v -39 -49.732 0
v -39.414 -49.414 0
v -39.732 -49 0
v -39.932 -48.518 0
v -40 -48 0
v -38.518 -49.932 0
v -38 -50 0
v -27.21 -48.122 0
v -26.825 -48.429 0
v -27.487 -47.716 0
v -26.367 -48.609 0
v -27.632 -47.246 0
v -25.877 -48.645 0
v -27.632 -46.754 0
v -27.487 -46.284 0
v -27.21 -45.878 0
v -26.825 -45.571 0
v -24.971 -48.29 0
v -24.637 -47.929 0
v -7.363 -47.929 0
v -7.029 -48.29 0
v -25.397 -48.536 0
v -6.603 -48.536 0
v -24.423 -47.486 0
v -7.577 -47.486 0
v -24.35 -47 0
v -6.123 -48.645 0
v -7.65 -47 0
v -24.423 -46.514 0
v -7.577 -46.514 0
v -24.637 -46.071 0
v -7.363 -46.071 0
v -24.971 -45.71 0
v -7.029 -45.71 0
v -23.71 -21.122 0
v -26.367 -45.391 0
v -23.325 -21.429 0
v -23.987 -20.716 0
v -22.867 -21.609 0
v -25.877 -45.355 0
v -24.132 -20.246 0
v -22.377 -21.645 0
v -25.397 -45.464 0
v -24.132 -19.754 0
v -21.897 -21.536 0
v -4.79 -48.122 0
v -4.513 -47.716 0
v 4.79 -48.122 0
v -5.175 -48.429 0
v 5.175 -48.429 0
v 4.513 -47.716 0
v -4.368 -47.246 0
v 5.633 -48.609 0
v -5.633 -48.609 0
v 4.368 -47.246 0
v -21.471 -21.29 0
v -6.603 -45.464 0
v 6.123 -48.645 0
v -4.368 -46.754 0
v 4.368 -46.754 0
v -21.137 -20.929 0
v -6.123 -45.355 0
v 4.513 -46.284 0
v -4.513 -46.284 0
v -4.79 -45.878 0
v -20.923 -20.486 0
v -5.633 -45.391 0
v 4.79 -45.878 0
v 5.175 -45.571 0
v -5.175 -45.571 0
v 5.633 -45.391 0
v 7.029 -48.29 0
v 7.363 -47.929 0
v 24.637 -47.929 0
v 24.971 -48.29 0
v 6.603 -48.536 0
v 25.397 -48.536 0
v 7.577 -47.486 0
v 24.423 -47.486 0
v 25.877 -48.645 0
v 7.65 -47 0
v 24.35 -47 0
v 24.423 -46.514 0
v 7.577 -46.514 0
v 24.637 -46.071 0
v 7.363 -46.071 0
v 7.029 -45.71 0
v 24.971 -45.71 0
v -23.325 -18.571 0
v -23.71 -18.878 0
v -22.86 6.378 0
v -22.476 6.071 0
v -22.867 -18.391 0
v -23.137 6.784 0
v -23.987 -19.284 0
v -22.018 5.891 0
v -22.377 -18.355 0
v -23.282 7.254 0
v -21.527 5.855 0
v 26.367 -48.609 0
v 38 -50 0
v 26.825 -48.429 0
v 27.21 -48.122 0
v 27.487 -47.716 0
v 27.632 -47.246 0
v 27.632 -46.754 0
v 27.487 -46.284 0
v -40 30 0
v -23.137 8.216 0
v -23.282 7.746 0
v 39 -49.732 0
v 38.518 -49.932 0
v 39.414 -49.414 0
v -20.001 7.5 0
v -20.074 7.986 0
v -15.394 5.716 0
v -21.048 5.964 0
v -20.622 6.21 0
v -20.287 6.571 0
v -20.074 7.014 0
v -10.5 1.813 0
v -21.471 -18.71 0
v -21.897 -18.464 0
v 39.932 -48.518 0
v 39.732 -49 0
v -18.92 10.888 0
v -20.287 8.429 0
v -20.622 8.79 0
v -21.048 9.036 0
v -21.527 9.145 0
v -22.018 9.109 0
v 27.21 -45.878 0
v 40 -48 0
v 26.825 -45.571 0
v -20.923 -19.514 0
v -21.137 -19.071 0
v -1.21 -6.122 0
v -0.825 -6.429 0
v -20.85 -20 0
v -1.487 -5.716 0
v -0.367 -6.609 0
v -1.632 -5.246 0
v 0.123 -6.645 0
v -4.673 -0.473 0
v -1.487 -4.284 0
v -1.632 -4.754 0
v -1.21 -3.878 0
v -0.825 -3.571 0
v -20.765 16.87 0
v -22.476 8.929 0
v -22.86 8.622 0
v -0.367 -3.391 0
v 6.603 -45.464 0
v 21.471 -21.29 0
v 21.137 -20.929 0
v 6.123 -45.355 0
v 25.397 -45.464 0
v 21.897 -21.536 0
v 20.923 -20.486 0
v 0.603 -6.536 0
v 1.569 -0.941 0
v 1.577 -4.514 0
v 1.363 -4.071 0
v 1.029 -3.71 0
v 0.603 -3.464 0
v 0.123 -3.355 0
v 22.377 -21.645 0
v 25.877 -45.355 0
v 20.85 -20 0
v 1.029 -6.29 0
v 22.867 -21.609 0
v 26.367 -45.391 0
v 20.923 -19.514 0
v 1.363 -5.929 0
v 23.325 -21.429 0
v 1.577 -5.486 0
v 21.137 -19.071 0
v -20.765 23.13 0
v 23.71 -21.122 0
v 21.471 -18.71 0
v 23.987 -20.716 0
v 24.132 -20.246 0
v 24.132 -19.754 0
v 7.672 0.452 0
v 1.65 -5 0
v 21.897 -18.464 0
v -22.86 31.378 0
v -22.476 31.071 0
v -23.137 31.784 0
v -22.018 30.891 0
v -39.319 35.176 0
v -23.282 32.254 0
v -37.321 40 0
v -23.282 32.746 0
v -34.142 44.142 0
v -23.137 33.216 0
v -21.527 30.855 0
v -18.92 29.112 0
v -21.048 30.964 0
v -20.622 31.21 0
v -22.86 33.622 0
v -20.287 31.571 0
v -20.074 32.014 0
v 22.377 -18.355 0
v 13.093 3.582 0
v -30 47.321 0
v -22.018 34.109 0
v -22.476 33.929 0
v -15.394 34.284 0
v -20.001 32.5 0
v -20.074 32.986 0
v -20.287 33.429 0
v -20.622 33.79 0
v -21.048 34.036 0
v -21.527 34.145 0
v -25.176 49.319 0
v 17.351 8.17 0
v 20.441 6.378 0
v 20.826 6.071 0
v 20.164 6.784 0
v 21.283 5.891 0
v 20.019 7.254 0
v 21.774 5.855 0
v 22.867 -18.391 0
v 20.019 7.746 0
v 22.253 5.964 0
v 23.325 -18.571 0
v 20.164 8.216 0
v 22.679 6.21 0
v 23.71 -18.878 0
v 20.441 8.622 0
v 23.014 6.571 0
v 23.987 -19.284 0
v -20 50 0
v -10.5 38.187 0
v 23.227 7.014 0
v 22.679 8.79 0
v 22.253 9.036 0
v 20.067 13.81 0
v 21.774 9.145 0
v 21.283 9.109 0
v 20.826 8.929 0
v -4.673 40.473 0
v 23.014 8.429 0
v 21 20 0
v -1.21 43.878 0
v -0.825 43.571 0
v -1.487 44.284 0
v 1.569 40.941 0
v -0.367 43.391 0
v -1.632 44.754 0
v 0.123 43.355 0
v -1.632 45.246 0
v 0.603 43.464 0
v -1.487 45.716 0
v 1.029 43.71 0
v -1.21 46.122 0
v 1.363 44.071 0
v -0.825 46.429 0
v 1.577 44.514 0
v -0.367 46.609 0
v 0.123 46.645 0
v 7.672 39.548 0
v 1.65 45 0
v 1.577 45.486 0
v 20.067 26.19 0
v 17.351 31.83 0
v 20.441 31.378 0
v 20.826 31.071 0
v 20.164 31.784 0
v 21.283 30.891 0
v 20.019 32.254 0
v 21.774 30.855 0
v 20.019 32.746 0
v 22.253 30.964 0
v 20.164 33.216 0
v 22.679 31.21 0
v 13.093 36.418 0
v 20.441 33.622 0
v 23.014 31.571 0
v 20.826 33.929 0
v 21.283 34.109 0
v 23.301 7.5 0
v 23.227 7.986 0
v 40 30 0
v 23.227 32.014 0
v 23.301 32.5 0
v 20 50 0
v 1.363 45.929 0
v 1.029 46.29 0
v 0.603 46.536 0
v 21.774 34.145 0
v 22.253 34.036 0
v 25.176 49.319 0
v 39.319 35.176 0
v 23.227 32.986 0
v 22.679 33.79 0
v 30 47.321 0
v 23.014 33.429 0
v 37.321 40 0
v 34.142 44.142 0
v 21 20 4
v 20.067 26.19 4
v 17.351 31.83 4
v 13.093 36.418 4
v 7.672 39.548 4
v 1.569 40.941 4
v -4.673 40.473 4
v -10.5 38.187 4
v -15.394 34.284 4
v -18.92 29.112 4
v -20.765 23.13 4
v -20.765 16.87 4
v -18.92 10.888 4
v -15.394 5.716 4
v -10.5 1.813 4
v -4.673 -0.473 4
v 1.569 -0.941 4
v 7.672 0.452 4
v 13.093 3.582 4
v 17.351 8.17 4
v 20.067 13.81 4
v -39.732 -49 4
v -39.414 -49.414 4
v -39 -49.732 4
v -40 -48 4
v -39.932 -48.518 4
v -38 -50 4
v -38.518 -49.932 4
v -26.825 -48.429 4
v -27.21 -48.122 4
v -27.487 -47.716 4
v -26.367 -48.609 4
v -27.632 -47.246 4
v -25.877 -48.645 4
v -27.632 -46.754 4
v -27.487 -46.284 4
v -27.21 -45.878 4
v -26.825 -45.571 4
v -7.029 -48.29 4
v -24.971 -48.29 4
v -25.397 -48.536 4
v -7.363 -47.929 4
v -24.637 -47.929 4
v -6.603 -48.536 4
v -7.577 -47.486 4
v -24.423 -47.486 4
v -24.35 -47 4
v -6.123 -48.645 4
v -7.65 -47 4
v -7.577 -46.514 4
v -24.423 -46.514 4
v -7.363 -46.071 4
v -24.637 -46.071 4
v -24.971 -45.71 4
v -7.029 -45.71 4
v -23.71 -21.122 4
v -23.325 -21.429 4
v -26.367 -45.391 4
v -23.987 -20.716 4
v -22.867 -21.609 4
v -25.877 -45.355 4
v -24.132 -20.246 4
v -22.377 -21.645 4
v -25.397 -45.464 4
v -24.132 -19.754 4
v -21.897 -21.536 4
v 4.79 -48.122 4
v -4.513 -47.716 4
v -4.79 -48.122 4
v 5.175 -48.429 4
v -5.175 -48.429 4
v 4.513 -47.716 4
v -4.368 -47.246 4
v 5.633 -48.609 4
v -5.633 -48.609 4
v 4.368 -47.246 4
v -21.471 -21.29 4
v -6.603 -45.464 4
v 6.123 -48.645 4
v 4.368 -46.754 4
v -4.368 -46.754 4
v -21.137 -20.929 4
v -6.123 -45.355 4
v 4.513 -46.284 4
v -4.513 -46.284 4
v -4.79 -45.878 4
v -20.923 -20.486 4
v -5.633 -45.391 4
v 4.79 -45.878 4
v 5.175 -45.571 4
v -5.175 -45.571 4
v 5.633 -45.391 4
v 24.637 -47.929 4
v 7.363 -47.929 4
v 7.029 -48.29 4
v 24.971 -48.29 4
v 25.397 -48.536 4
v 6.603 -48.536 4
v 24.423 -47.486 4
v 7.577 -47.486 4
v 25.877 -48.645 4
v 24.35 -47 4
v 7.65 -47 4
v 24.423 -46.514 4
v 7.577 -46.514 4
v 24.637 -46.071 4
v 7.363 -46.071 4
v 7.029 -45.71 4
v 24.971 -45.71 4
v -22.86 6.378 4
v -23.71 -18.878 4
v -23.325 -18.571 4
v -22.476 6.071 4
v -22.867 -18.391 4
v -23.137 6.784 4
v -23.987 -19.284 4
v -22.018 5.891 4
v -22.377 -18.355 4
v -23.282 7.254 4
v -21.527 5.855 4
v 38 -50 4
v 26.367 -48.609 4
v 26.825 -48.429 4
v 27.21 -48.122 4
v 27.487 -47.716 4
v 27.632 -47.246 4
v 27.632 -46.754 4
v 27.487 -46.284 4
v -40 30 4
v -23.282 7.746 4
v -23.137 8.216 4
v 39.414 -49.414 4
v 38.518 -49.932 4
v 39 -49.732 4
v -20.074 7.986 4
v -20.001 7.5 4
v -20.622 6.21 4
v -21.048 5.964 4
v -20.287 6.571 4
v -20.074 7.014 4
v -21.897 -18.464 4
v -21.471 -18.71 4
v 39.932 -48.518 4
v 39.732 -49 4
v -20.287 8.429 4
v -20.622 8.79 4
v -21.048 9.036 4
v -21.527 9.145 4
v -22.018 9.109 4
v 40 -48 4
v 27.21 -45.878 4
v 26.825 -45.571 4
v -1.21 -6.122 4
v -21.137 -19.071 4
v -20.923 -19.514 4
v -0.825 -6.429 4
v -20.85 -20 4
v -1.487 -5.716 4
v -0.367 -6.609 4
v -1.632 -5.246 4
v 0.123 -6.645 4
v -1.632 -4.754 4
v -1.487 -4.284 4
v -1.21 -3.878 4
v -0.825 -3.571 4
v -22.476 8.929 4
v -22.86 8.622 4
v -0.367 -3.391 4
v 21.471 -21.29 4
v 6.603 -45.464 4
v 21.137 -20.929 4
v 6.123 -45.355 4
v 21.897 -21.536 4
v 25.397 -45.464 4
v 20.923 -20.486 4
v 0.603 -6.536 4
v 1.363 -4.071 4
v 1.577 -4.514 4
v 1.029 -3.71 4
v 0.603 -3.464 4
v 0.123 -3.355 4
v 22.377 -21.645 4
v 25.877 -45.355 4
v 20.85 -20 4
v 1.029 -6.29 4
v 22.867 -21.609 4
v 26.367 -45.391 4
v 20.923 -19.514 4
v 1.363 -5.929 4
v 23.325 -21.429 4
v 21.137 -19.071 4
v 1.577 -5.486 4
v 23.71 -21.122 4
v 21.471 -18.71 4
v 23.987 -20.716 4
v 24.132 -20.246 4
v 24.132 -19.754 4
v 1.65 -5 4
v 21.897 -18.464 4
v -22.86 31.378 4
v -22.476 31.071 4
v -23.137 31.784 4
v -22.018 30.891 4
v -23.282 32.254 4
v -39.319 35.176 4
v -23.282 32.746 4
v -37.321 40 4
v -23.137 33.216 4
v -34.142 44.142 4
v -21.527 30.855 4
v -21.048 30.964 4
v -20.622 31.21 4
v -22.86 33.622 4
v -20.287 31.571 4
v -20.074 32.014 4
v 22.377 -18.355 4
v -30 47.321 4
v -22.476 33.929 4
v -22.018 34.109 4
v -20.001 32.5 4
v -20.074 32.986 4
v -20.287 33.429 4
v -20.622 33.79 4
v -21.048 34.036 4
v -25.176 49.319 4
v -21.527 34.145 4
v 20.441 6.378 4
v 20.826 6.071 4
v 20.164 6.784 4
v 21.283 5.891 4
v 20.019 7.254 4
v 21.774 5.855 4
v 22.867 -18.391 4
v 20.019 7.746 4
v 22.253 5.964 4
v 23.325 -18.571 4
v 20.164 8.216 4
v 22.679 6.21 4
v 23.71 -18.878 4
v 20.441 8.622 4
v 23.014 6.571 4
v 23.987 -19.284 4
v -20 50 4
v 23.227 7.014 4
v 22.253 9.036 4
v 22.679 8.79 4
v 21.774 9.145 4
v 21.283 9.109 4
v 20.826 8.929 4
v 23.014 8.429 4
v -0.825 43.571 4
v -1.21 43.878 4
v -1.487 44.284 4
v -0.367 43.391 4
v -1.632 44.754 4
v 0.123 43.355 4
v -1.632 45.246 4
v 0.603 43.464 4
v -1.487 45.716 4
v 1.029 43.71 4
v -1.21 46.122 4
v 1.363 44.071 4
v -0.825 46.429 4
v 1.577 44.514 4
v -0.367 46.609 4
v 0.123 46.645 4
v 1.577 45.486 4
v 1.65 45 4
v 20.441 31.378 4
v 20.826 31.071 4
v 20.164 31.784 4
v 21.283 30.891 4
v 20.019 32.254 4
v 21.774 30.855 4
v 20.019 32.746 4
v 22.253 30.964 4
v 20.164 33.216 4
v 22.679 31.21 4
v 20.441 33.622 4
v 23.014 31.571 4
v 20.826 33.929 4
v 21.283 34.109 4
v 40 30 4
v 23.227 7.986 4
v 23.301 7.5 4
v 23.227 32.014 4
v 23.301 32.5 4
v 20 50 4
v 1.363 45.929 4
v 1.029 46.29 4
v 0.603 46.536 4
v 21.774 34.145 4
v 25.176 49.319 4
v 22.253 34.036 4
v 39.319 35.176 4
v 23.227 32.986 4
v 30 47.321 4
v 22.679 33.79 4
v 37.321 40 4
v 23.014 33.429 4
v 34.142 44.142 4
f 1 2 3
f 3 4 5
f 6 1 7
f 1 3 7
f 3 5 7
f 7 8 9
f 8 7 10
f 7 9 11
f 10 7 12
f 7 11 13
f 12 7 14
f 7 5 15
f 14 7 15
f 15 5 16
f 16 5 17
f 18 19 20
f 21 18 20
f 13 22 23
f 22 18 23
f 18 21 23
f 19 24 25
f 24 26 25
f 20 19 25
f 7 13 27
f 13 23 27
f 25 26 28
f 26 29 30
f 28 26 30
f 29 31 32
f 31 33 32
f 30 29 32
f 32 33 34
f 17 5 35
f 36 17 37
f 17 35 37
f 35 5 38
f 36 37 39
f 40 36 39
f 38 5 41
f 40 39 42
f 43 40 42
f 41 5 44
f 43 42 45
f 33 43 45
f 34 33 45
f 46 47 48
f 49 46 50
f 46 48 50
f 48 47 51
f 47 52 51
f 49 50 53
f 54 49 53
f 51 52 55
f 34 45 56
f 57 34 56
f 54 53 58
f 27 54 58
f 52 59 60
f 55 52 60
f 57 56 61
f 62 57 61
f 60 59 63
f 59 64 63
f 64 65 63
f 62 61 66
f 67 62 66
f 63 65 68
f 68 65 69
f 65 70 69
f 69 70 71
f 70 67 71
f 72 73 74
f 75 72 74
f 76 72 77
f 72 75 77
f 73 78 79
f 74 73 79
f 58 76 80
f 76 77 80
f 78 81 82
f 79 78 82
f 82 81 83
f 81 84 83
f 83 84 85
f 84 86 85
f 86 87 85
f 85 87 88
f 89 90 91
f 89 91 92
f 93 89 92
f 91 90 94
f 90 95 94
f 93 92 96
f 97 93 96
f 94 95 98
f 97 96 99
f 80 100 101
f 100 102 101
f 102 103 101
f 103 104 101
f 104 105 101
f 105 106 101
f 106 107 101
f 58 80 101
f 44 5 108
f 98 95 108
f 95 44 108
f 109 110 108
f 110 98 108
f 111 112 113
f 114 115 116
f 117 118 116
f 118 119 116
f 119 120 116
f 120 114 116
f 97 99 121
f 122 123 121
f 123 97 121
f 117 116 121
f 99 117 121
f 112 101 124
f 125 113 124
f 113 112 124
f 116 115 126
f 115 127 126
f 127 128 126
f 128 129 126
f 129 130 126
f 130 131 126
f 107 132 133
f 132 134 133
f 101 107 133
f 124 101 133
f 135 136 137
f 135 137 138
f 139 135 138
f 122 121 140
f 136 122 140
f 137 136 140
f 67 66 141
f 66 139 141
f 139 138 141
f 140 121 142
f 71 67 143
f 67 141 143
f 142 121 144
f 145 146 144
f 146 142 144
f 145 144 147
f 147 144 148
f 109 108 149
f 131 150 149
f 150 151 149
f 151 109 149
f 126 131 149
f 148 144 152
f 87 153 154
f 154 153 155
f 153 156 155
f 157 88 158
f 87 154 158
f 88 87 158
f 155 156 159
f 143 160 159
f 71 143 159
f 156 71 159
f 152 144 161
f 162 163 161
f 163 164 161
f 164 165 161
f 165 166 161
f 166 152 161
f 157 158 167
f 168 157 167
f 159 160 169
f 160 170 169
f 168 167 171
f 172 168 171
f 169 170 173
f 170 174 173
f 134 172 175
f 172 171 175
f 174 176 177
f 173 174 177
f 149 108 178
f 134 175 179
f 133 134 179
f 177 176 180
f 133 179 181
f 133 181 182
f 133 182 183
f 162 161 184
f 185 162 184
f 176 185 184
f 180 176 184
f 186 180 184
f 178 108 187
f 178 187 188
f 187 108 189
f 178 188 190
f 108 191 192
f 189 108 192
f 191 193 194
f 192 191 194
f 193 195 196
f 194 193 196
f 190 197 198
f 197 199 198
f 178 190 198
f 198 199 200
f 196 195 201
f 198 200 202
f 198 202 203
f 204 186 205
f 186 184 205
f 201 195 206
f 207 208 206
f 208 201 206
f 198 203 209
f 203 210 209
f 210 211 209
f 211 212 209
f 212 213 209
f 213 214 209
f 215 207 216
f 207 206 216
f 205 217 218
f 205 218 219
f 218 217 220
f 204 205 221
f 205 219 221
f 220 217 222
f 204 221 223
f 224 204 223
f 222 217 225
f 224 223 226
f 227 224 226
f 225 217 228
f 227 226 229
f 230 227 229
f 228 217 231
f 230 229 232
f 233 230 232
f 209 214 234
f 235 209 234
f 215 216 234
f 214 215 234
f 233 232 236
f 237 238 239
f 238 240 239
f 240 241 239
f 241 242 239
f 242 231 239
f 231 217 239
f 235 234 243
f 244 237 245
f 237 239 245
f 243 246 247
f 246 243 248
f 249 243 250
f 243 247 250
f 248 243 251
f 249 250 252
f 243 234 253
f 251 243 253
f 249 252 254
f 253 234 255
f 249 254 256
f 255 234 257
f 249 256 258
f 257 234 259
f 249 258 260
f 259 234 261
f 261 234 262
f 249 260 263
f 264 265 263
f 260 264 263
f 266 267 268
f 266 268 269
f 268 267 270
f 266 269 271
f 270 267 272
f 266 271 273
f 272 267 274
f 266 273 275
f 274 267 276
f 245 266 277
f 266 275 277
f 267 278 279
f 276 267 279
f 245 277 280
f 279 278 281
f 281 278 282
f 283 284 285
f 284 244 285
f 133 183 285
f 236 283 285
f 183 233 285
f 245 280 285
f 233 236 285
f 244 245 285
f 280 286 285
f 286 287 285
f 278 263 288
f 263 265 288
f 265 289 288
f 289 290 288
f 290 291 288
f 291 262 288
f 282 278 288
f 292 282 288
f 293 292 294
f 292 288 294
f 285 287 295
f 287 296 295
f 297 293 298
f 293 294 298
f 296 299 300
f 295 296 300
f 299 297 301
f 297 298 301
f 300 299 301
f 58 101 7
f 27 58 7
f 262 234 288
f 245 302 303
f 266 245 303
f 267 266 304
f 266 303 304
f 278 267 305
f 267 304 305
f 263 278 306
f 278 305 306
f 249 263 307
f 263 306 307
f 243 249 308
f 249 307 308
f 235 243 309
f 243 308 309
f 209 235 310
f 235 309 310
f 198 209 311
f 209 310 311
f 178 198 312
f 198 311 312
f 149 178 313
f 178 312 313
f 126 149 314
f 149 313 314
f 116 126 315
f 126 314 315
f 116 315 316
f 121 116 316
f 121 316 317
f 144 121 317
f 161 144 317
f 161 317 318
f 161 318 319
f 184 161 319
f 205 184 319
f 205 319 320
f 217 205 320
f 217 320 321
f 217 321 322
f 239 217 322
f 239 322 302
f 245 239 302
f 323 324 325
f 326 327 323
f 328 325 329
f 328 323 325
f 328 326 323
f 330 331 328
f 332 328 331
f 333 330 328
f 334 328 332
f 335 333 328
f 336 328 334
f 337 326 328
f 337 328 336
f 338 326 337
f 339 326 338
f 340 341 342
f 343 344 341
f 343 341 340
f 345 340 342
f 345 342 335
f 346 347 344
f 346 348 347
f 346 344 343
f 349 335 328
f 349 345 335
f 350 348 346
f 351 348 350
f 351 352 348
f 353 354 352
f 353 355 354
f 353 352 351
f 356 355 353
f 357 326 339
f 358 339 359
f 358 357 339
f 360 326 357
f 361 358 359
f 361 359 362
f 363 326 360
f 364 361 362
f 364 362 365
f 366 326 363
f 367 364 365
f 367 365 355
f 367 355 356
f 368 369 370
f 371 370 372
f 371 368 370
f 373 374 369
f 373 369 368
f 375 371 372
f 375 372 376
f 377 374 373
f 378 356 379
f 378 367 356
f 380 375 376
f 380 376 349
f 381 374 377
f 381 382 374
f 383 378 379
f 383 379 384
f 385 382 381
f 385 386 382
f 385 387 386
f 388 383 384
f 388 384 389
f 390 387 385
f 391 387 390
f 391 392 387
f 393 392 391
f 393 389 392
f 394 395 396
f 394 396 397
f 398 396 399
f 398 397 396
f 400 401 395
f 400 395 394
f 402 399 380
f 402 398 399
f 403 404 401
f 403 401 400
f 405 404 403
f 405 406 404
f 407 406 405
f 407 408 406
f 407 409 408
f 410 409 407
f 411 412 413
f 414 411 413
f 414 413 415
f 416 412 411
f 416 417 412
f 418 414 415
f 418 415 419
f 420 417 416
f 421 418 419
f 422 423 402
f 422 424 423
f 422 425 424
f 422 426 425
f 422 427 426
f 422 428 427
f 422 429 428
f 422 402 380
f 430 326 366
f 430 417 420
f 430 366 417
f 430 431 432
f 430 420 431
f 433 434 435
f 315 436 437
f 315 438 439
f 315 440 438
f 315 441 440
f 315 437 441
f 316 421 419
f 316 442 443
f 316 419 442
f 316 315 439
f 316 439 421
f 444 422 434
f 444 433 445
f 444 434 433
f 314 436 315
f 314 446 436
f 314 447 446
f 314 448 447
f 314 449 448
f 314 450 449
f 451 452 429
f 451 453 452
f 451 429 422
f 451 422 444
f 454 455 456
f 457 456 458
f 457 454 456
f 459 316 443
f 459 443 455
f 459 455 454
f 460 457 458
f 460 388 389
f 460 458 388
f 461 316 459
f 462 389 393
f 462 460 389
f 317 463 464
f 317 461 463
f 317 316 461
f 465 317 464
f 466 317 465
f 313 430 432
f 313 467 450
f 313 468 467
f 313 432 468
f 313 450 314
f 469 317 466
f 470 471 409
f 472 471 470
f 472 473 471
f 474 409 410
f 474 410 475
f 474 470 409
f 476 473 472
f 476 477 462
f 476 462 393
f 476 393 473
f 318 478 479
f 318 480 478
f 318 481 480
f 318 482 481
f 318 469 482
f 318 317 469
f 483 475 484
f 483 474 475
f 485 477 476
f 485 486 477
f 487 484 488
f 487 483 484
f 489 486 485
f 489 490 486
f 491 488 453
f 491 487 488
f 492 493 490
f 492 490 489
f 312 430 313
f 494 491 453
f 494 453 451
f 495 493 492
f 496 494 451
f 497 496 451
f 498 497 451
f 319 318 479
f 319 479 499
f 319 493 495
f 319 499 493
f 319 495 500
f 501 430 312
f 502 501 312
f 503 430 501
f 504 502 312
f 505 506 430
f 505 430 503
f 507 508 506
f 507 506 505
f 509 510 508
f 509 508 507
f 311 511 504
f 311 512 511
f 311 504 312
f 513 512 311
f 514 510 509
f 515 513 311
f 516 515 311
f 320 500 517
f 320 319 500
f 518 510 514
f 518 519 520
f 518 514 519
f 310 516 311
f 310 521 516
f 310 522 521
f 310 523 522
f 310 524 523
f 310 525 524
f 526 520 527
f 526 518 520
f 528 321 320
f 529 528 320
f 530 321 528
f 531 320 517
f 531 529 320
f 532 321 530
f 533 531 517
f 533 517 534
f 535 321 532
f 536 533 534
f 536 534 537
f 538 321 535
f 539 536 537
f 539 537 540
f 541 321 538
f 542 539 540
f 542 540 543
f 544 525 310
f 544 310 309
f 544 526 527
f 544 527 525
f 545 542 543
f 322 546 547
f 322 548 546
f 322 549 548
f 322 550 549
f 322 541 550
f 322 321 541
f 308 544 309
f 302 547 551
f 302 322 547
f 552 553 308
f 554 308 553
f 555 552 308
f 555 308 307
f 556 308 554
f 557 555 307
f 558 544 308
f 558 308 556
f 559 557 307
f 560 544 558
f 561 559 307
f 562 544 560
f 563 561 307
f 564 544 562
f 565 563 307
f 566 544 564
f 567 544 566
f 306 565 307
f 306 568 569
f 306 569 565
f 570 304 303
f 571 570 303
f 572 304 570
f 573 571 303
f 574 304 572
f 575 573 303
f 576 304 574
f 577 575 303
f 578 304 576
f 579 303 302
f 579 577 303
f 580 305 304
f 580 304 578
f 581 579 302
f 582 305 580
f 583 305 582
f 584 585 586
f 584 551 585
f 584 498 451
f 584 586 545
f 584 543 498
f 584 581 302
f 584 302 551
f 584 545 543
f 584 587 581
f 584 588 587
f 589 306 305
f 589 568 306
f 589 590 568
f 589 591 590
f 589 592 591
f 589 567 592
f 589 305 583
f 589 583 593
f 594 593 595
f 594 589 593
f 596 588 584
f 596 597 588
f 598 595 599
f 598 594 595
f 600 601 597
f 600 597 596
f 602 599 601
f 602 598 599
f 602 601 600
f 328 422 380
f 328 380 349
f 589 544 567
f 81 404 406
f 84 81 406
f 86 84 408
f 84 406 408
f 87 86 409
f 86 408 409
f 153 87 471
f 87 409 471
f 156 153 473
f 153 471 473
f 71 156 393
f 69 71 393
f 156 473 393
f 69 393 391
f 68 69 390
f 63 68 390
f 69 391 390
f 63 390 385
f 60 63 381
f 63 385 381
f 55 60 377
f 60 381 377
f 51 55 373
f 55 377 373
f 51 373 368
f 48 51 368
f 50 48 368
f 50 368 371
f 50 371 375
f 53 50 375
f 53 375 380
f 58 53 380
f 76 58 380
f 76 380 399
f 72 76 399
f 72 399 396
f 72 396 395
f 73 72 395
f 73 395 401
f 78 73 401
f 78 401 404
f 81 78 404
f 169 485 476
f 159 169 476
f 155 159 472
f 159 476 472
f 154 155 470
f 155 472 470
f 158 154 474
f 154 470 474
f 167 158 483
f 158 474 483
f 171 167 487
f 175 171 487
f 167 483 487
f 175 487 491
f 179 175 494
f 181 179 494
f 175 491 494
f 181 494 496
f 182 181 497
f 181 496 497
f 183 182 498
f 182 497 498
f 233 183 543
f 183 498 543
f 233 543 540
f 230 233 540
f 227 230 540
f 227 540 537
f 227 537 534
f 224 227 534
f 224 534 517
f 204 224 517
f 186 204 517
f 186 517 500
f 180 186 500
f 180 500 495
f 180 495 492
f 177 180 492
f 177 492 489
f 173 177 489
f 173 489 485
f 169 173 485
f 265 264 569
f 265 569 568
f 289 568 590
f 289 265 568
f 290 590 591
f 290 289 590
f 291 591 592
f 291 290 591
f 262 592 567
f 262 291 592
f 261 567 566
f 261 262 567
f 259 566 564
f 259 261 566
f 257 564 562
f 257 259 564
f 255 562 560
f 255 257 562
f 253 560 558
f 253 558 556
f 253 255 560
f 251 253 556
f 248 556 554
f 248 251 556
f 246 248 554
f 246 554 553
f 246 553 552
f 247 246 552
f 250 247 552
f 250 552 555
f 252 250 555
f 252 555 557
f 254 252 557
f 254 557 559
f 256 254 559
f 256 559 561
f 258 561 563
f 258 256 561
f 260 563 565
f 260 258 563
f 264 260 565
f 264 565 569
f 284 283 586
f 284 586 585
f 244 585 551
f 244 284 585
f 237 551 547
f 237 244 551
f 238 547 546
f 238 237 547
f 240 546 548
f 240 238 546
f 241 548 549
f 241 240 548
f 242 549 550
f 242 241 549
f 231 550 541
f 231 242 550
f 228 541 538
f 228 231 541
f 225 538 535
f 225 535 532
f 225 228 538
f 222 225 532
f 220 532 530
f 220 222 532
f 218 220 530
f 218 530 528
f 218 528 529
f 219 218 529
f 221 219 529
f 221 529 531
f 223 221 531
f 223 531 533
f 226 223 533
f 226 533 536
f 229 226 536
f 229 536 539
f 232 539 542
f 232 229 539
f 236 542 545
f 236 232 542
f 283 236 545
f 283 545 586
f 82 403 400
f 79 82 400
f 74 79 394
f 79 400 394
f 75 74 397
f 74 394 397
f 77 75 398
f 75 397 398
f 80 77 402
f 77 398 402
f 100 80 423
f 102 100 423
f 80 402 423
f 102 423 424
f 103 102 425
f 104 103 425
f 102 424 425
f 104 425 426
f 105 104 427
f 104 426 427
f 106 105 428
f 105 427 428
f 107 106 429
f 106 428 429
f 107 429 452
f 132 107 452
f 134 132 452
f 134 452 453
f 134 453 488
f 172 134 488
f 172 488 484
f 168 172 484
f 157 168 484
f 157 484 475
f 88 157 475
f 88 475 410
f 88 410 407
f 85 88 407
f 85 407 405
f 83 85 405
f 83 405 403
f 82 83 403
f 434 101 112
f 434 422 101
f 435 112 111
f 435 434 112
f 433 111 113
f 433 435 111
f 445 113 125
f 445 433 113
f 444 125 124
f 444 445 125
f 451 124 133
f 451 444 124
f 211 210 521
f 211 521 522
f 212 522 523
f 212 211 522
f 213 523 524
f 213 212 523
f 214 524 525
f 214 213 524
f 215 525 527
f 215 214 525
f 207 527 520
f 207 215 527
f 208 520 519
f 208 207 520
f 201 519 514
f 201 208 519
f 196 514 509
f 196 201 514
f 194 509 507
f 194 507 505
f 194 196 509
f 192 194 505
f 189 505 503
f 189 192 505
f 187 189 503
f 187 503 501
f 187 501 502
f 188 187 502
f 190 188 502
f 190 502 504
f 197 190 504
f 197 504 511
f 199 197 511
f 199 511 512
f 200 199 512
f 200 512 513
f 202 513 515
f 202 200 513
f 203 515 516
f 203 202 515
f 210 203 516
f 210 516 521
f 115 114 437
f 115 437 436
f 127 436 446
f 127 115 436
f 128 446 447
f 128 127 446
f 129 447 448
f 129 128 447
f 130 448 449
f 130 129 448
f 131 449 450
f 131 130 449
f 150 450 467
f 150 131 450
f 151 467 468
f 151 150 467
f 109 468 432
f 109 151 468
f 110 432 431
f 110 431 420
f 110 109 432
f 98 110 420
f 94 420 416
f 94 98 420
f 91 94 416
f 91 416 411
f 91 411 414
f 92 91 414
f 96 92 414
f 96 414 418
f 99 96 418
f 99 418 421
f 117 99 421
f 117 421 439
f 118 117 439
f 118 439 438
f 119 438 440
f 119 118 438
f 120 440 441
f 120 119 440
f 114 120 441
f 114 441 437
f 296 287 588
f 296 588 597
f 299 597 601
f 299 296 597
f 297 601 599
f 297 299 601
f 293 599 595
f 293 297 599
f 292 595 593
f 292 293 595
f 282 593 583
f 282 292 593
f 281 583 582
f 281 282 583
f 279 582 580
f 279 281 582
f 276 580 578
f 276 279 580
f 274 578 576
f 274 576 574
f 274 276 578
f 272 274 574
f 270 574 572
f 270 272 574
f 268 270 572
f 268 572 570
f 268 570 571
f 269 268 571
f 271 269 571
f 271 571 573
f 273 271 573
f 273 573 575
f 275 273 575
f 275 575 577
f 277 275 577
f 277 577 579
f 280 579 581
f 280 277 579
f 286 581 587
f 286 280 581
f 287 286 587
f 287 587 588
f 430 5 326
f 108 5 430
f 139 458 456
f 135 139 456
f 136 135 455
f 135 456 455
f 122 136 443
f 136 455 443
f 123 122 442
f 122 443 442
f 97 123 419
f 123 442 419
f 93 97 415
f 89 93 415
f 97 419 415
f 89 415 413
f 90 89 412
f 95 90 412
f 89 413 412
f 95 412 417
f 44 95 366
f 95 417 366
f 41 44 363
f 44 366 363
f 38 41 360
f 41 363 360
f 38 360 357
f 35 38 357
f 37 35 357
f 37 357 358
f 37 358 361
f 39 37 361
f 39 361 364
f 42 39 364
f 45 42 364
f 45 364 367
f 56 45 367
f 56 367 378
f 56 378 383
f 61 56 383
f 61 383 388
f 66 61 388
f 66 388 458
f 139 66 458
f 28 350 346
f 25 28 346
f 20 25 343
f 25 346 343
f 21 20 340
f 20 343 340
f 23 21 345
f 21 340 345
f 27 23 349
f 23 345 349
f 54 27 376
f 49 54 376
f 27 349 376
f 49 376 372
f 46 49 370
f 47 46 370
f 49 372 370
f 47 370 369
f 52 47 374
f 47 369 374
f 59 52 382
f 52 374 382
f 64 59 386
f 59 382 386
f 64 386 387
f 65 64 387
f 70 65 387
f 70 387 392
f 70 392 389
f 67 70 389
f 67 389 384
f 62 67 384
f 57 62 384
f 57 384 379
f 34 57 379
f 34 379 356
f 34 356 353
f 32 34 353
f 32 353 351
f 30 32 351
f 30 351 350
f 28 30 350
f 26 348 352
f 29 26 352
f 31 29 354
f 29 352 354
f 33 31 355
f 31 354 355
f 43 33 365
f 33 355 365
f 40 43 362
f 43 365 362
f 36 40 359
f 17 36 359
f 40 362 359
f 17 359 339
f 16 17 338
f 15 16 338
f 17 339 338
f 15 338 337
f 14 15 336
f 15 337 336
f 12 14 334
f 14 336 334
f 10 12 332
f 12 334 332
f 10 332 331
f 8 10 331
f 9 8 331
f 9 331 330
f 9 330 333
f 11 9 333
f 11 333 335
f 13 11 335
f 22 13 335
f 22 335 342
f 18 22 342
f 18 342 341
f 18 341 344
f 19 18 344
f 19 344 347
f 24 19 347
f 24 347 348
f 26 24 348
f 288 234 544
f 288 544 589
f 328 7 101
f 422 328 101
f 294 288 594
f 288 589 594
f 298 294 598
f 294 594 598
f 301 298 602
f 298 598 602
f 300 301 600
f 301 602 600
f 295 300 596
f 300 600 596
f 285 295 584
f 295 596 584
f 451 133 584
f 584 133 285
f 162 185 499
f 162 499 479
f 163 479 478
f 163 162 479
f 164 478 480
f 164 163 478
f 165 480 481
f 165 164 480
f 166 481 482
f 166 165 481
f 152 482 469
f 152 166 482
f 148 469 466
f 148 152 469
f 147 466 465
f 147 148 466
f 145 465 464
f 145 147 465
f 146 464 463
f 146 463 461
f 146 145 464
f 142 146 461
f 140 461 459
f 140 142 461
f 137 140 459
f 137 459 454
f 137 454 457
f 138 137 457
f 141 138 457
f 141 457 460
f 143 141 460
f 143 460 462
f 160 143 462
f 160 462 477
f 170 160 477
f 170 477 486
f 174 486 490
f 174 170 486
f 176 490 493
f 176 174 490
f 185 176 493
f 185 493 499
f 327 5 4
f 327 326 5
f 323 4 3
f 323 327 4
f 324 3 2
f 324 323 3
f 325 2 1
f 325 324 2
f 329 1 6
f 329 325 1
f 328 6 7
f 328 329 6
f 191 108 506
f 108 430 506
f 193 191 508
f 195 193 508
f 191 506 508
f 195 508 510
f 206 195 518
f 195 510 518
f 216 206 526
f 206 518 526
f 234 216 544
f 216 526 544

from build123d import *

# Parameters (mm, degrees)
SKETCH_1_W          = 80
SKETCH_1_H          = 100
SKETCH_1_R          = 1.65
EXTRUDE_1_DEPTH     = 4
SKETCH_3_R          = 21
CUT_EXTRUDE_2_DEPTH = 65.156059729
FILLET_1_R          = 2
SKETCH_2_R          = 1.65
CUT_EXTRUDE_1_DEPTH = 65.156059729
FILLET_2_R          = 20
SKETCH_4_R          = 1.65
CUT_EXTRUDE_3_DEPTH = 65.156059729


with BuildPart() as part:
    # 草图1 → 凸台-拉伸1 (new body)
    with BuildSketch(Plane.XY):
        Rectangle(SKETCH_1_W, SKETCH_1_H)
        with Locations((0, 45)):
            Circle(SKETCH_1_R, mode=Mode.SUBTRACT)
        with Locations((21.650635095, 32.5)):
            Circle(SKETCH_1_R, mode=Mode.SUBTRACT)
        with Locations((21.650635095, 7.5)):
            Circle(SKETCH_1_R, mode=Mode.SUBTRACT)
        with Locations((0, -5)):
            Circle(SKETCH_1_R, mode=Mode.SUBTRACT)
        with Locations((-21.650635095, 7.5)):
            Circle(SKETCH_1_R, mode=Mode.SUBTRACT)
        with Locations((-21.650635095, 32.5)):
            Circle(SKETCH_1_R, mode=Mode.SUBTRACT)
    extrude(amount=EXTRUDE_1_DEPTH)

    # 草图3 → 切除-拉伸2 (cut, through all)
    with BuildSketch(Plane.XY.offset(4)):
        with Locations((0, 20)):
            Circle(SKETCH_3_R)
    extrude(amount=-CUT_EXTRUDE_2_DEPTH, mode=Mode.SUBTRACT)

    # 圆角1
    fillet_1_edges = [part.edges().sort_by_distance(p)[0] for p in [
        (40, -50, 2),
        (-40, -50, 2),
    ]]
    fillet(fillet_1_edges, radius=FILLET_1_R)

    # 草图2 → 切除-拉伸1 (cut, through all)
    with BuildSketch(Plane.XY.offset(4)):
        with Locations((-26, -47)):
            Circle(SKETCH_2_R)
        with Locations(Location((-6, -47, 0), (0, 0, 180))):
            Circle(SKETCH_2_R)
        with Locations((6, -47)):
            Circle(SKETCH_2_R)
        with Locations(Location((26, -47, 0), (0, 0, 180))):
            Circle(SKETCH_2_R)
    extrude(amount=-CUT_EXTRUDE_1_DEPTH, mode=Mode.SUBTRACT)

    # 圆角2
    fillet_2_edges = [part.edges().sort_by_distance(p)[0] for p in [
        (-40, 50, 2),
        (40, 50, 2),
    ]]
    fillet(fillet_2_edges, radius=FILLET_2_R)

    # 草图4 → 切除-拉伸3 (cut, through all)
    with BuildSketch(Plane.XY.offset(4)):
        with Locations((-22.5, -20)):
            Circle(SKETCH_4_R)
        with Locations((-22.5, 60)):
            Circle(SKETCH_4_R)
        with Locations(Location((22.5, -20, 0), (0, 0, 180))):
            Circle(SKETCH_4_R)
        with Locations((22.5, 60)):
            Circle(SKETCH_4_R)
    extrude(amount=-CUT_EXTRUDE_3_DEPTH, mode=Mode.SUBTRACT)


solid = part.part
